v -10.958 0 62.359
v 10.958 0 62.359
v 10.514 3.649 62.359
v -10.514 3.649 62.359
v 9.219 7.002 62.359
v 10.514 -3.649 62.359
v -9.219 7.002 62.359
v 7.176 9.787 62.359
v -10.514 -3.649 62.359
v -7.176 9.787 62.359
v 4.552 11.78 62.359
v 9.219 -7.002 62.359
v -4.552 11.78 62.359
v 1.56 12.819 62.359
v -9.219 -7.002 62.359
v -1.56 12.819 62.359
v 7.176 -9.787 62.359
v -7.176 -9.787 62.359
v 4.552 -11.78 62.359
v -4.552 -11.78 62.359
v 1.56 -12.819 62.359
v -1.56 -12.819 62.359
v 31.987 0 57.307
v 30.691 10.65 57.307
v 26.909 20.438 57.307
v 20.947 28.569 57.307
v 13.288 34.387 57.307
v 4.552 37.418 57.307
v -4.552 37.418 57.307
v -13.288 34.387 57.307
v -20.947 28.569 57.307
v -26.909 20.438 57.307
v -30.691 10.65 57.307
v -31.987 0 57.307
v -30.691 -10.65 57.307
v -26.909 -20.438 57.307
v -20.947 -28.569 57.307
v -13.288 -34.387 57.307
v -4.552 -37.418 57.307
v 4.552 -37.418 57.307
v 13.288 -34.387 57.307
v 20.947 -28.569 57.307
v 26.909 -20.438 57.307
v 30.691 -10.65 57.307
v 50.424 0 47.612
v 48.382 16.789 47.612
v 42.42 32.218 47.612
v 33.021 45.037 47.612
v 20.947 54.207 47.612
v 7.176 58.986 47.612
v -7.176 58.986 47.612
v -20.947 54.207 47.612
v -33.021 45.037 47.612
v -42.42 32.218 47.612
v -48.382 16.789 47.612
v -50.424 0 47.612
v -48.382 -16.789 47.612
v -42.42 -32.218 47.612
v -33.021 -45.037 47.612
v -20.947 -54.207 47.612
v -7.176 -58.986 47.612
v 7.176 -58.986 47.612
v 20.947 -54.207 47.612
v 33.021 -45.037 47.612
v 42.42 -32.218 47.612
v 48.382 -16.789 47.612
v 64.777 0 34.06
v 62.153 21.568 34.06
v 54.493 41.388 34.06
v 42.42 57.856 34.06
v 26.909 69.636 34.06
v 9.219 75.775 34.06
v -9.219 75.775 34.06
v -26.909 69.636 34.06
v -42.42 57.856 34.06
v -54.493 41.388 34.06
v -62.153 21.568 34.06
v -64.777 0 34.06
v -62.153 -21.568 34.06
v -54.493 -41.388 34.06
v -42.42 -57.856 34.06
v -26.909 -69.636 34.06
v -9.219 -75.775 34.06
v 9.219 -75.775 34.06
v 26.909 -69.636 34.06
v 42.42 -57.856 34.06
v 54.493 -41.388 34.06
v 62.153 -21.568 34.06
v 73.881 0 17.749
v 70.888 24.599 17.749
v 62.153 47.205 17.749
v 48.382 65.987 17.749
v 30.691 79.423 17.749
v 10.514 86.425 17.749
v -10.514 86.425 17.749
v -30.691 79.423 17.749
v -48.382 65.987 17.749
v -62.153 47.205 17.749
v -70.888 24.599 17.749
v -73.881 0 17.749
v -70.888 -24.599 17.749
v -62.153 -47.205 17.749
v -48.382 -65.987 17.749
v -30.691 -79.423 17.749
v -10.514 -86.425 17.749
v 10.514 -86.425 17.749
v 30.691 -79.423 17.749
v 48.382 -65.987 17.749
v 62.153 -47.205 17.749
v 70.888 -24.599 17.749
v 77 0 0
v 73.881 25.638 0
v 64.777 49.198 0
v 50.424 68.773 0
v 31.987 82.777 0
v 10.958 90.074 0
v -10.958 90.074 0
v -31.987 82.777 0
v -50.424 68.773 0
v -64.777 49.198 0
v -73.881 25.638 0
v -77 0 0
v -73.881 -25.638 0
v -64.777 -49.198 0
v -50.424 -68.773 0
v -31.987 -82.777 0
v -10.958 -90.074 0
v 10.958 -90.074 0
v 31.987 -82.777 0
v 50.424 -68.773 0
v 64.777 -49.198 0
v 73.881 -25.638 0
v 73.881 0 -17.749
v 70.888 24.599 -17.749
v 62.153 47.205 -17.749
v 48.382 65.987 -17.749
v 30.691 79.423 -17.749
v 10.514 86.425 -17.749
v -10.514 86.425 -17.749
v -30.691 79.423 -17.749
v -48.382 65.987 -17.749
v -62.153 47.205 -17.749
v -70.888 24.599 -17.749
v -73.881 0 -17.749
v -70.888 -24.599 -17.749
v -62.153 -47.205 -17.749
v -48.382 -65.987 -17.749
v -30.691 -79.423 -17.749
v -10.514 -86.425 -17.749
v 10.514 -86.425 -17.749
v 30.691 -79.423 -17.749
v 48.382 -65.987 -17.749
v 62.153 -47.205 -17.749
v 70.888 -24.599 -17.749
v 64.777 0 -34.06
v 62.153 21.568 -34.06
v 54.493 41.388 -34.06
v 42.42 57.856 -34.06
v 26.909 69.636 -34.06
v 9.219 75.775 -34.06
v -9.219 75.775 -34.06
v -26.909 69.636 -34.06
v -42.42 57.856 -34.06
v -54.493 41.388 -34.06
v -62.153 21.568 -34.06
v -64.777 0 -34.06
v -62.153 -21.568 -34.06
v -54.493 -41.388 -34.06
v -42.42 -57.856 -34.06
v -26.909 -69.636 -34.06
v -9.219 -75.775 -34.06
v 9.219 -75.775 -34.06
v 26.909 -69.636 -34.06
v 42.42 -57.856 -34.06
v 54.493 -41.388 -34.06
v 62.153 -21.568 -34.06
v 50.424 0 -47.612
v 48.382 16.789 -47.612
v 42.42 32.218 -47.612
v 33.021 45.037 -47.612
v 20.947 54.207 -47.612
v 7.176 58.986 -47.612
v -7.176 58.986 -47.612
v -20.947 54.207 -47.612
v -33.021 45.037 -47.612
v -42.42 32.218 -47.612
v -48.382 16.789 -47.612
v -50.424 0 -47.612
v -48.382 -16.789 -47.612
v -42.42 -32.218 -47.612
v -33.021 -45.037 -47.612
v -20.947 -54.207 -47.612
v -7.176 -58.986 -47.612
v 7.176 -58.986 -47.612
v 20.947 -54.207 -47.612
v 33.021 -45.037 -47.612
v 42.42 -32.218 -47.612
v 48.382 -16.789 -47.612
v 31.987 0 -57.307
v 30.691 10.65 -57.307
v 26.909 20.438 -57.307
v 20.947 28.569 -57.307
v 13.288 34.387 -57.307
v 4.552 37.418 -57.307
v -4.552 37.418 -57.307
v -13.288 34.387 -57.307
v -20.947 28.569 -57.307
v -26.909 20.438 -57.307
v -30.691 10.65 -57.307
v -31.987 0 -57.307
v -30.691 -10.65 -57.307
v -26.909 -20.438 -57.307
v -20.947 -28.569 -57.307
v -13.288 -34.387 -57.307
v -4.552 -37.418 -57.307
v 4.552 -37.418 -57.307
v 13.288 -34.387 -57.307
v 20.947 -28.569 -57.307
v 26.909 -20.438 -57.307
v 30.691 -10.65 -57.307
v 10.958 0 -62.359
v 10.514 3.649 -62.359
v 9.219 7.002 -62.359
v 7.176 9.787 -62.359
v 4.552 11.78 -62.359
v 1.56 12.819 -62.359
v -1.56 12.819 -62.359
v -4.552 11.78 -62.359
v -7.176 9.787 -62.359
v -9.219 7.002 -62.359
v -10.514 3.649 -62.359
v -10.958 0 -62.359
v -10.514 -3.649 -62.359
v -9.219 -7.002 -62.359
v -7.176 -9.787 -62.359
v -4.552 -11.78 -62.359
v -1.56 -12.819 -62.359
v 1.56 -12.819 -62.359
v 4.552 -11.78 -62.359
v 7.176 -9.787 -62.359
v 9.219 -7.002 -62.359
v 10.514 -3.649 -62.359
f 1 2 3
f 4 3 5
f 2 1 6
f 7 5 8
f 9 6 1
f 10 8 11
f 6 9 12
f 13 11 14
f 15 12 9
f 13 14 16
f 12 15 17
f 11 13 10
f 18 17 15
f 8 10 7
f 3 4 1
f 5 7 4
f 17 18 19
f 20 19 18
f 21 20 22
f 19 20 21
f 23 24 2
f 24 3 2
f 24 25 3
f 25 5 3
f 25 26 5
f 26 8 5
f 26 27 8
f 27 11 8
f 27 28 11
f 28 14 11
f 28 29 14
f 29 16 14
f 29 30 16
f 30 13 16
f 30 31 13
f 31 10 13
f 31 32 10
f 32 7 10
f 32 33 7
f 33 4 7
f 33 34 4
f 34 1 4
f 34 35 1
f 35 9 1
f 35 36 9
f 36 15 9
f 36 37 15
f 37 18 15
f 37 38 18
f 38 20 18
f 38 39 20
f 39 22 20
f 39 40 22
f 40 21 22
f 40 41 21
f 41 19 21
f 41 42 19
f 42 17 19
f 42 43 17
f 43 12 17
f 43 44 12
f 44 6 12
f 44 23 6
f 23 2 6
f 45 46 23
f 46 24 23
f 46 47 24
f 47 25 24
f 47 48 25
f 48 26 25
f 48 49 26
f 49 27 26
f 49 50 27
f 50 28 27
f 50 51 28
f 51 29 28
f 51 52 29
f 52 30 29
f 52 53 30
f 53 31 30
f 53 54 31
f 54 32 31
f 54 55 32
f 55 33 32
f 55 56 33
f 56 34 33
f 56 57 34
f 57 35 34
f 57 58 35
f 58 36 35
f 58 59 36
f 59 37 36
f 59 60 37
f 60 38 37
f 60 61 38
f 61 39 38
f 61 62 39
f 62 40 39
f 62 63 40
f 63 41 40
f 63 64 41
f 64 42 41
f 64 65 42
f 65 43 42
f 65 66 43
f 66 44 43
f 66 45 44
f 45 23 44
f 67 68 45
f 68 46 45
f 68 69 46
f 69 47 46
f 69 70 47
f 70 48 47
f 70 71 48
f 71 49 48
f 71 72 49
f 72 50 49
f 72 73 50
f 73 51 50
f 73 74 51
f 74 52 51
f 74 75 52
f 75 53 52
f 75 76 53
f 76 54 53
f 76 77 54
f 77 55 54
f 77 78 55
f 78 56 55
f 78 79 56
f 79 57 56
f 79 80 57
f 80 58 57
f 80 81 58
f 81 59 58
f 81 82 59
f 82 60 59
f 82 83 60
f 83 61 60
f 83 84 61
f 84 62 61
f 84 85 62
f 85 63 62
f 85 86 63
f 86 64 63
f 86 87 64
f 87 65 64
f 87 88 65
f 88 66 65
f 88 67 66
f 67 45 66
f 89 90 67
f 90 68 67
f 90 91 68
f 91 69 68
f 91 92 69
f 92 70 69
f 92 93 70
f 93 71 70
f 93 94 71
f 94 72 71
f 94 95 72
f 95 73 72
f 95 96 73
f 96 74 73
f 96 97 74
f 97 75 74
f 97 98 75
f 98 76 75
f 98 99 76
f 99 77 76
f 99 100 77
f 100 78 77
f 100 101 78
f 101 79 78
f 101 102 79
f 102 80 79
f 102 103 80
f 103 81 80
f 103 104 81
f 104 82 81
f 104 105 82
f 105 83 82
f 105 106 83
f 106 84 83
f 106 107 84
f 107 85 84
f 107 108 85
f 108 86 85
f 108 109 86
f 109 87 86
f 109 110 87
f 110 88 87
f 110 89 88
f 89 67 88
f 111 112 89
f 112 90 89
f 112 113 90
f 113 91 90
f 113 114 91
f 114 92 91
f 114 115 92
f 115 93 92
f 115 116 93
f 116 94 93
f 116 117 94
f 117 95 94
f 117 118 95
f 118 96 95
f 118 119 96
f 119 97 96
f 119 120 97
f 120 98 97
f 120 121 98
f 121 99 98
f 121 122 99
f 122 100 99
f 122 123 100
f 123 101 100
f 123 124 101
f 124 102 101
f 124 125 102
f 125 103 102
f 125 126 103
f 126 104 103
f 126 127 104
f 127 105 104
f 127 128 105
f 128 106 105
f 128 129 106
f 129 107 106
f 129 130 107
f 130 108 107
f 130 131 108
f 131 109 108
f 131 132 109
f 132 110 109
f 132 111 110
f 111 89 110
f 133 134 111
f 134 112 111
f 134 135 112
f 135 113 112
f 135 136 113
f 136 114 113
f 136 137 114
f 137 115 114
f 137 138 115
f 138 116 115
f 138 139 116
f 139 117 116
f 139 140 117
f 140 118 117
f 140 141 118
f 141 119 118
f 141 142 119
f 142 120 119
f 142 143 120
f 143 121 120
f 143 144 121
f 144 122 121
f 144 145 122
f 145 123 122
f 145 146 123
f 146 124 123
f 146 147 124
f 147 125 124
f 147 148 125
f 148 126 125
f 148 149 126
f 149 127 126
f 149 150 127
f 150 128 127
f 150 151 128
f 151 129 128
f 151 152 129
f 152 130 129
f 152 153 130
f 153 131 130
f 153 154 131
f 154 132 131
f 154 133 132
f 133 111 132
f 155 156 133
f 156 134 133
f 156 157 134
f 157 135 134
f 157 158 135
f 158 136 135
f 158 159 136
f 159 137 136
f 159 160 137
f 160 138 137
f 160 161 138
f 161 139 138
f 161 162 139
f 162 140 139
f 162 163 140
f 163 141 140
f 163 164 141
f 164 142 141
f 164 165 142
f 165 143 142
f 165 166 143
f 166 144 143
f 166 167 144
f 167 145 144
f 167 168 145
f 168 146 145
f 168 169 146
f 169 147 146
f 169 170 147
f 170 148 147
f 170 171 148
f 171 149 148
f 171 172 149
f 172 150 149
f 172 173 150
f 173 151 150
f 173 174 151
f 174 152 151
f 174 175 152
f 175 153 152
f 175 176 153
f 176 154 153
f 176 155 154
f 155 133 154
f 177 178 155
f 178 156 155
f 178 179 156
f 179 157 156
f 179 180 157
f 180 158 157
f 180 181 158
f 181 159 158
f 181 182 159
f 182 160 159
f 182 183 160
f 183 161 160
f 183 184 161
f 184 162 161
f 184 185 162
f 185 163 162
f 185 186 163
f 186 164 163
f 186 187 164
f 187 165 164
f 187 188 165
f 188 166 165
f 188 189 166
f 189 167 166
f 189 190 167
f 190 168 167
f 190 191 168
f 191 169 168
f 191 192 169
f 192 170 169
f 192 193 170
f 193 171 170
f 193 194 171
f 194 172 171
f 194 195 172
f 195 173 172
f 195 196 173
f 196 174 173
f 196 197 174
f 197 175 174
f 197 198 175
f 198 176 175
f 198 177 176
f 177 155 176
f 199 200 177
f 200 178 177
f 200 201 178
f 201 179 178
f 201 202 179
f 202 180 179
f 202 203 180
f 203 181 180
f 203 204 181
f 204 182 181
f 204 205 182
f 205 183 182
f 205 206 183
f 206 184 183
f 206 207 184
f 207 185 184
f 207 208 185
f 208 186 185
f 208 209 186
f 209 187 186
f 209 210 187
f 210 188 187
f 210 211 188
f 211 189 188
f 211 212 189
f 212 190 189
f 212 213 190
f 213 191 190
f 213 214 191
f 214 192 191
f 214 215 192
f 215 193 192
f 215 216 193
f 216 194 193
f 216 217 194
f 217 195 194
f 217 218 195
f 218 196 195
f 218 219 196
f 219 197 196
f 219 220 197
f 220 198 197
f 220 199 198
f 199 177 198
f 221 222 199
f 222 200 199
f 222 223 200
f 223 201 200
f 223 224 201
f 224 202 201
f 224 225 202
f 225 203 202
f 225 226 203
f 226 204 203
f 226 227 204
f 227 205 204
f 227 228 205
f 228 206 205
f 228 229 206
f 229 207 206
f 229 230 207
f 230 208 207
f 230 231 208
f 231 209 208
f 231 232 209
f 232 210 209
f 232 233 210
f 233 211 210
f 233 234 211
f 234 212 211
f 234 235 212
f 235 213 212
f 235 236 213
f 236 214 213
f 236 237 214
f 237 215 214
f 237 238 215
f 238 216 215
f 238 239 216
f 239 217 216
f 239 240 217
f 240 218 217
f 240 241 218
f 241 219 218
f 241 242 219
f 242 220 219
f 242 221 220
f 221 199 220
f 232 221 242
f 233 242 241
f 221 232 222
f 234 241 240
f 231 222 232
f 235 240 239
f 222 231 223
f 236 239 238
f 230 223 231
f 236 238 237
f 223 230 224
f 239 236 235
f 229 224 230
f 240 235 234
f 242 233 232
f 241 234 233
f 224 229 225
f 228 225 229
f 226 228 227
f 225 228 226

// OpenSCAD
// Generated by SolidPython 1.0.1 on 2020-07-29 00:46:49


scale(v = [11, 13, 9]) {
	sphere(r = 7);
}
/***********************************************
*********      SolidPython code:      **********
************************************************
 
# import packages: SolidPython
from solid import *
from solid.utils import *
from itertools import chain, combinations, permutations


class Resize:

    def __init__(self, scad_file):
        self.scad_file = scad_file
        #self.scad_file = import_scad(scad_file)
        # cone/cylinder param:
        self.r1 = 0
        self.r2 = 0
        self.h = 0
        # rectangular prism param:
        self.w = 0
        self.l = 0
        # ellipse param:
        self.r = 0

    # import OpenScad code (file name corresponds to shape)


    # classify shape + parameters
    def assign(self, param1, param2, param3):
        if self.scad_file == 'cone.scad':
            self.r1 = param1
            self.r2 = param2
            self.h = param3
        elif self.scad_file == 'cylinder.scad':
            self.r1 = param1
            self.r2 = param2
            self.h = param3
        elif self.scad_file == 'rectangularPrism.scad':
            self.h = param1
            self.l = param2
            self.w = param3
        else:
            self.r = param1
            self.h = param2

    # resize parameters
    def iterate(self):
        x = range(3, 20, 2)
        i = 1
        if self.scad_file == 'cone.scad':
            tempList = list(permutations(x, 2))
            for temp in tempList:
                param1 = temp[0]
                param2 = temp[1]
                filepath = 'produced_scad_files/' + 'cone' + str(param1) + '_' + str(param2) + '_' + '.scad'
                scad_render_to_file(cylinder(h=param1, r1=param2, r2=0), filepath)

        elif self.scad_file == 'cylinder.scad':
            tempList = list(permutations(x, 3))
            for temp in tempList:
                param1 = temp[0]
                param2 = temp[1]
                filepath = 'produced_scad_files/' + 'cylinder' + str(param1) + '_' + str(param2) + '_' + '.scad'
                scad_render_to_file(cylinder(h=param1, r1=param2, r2=param2), filepath)

        elif self.scad_file == 'rectangularPrism.scad':
            tempList = list(permutations(x, 3))
            for temp in tempList:
                param1 = temp[0]
                param2 = temp[1]
                param3 = temp[2]
                filepath = 'produced_scad_files/' + 'rectangularPrism' + str(param1) + '_' + str(param2) + '_' + str(
                    param3) + '.scad'
                scad_render_to_file(cube(size=(param1, param2, param3)), filepath)

        elif self.scad_file == 'ellipse.scad':
            tempList = list(permutations(x, 4))
            for temp in tempList:
                param1 = temp[0]
                param2 = temp[1]
                param3 = temp[2]
                param4 = temp[3]
                filepath = 'produced_scad_files/' + 'ellipse' + str(param1) + '_' + str(param2) + '_' + str(param3) + '_' + str(param4) + '.scad'
                scad_render_to_file(scale([param1, param2, param3])(sphere(r=param4)), filepath)

    def render_to_scadfile(self):
        scad_render_to_file(scad, 'example.scad') 
 
************************************************/
